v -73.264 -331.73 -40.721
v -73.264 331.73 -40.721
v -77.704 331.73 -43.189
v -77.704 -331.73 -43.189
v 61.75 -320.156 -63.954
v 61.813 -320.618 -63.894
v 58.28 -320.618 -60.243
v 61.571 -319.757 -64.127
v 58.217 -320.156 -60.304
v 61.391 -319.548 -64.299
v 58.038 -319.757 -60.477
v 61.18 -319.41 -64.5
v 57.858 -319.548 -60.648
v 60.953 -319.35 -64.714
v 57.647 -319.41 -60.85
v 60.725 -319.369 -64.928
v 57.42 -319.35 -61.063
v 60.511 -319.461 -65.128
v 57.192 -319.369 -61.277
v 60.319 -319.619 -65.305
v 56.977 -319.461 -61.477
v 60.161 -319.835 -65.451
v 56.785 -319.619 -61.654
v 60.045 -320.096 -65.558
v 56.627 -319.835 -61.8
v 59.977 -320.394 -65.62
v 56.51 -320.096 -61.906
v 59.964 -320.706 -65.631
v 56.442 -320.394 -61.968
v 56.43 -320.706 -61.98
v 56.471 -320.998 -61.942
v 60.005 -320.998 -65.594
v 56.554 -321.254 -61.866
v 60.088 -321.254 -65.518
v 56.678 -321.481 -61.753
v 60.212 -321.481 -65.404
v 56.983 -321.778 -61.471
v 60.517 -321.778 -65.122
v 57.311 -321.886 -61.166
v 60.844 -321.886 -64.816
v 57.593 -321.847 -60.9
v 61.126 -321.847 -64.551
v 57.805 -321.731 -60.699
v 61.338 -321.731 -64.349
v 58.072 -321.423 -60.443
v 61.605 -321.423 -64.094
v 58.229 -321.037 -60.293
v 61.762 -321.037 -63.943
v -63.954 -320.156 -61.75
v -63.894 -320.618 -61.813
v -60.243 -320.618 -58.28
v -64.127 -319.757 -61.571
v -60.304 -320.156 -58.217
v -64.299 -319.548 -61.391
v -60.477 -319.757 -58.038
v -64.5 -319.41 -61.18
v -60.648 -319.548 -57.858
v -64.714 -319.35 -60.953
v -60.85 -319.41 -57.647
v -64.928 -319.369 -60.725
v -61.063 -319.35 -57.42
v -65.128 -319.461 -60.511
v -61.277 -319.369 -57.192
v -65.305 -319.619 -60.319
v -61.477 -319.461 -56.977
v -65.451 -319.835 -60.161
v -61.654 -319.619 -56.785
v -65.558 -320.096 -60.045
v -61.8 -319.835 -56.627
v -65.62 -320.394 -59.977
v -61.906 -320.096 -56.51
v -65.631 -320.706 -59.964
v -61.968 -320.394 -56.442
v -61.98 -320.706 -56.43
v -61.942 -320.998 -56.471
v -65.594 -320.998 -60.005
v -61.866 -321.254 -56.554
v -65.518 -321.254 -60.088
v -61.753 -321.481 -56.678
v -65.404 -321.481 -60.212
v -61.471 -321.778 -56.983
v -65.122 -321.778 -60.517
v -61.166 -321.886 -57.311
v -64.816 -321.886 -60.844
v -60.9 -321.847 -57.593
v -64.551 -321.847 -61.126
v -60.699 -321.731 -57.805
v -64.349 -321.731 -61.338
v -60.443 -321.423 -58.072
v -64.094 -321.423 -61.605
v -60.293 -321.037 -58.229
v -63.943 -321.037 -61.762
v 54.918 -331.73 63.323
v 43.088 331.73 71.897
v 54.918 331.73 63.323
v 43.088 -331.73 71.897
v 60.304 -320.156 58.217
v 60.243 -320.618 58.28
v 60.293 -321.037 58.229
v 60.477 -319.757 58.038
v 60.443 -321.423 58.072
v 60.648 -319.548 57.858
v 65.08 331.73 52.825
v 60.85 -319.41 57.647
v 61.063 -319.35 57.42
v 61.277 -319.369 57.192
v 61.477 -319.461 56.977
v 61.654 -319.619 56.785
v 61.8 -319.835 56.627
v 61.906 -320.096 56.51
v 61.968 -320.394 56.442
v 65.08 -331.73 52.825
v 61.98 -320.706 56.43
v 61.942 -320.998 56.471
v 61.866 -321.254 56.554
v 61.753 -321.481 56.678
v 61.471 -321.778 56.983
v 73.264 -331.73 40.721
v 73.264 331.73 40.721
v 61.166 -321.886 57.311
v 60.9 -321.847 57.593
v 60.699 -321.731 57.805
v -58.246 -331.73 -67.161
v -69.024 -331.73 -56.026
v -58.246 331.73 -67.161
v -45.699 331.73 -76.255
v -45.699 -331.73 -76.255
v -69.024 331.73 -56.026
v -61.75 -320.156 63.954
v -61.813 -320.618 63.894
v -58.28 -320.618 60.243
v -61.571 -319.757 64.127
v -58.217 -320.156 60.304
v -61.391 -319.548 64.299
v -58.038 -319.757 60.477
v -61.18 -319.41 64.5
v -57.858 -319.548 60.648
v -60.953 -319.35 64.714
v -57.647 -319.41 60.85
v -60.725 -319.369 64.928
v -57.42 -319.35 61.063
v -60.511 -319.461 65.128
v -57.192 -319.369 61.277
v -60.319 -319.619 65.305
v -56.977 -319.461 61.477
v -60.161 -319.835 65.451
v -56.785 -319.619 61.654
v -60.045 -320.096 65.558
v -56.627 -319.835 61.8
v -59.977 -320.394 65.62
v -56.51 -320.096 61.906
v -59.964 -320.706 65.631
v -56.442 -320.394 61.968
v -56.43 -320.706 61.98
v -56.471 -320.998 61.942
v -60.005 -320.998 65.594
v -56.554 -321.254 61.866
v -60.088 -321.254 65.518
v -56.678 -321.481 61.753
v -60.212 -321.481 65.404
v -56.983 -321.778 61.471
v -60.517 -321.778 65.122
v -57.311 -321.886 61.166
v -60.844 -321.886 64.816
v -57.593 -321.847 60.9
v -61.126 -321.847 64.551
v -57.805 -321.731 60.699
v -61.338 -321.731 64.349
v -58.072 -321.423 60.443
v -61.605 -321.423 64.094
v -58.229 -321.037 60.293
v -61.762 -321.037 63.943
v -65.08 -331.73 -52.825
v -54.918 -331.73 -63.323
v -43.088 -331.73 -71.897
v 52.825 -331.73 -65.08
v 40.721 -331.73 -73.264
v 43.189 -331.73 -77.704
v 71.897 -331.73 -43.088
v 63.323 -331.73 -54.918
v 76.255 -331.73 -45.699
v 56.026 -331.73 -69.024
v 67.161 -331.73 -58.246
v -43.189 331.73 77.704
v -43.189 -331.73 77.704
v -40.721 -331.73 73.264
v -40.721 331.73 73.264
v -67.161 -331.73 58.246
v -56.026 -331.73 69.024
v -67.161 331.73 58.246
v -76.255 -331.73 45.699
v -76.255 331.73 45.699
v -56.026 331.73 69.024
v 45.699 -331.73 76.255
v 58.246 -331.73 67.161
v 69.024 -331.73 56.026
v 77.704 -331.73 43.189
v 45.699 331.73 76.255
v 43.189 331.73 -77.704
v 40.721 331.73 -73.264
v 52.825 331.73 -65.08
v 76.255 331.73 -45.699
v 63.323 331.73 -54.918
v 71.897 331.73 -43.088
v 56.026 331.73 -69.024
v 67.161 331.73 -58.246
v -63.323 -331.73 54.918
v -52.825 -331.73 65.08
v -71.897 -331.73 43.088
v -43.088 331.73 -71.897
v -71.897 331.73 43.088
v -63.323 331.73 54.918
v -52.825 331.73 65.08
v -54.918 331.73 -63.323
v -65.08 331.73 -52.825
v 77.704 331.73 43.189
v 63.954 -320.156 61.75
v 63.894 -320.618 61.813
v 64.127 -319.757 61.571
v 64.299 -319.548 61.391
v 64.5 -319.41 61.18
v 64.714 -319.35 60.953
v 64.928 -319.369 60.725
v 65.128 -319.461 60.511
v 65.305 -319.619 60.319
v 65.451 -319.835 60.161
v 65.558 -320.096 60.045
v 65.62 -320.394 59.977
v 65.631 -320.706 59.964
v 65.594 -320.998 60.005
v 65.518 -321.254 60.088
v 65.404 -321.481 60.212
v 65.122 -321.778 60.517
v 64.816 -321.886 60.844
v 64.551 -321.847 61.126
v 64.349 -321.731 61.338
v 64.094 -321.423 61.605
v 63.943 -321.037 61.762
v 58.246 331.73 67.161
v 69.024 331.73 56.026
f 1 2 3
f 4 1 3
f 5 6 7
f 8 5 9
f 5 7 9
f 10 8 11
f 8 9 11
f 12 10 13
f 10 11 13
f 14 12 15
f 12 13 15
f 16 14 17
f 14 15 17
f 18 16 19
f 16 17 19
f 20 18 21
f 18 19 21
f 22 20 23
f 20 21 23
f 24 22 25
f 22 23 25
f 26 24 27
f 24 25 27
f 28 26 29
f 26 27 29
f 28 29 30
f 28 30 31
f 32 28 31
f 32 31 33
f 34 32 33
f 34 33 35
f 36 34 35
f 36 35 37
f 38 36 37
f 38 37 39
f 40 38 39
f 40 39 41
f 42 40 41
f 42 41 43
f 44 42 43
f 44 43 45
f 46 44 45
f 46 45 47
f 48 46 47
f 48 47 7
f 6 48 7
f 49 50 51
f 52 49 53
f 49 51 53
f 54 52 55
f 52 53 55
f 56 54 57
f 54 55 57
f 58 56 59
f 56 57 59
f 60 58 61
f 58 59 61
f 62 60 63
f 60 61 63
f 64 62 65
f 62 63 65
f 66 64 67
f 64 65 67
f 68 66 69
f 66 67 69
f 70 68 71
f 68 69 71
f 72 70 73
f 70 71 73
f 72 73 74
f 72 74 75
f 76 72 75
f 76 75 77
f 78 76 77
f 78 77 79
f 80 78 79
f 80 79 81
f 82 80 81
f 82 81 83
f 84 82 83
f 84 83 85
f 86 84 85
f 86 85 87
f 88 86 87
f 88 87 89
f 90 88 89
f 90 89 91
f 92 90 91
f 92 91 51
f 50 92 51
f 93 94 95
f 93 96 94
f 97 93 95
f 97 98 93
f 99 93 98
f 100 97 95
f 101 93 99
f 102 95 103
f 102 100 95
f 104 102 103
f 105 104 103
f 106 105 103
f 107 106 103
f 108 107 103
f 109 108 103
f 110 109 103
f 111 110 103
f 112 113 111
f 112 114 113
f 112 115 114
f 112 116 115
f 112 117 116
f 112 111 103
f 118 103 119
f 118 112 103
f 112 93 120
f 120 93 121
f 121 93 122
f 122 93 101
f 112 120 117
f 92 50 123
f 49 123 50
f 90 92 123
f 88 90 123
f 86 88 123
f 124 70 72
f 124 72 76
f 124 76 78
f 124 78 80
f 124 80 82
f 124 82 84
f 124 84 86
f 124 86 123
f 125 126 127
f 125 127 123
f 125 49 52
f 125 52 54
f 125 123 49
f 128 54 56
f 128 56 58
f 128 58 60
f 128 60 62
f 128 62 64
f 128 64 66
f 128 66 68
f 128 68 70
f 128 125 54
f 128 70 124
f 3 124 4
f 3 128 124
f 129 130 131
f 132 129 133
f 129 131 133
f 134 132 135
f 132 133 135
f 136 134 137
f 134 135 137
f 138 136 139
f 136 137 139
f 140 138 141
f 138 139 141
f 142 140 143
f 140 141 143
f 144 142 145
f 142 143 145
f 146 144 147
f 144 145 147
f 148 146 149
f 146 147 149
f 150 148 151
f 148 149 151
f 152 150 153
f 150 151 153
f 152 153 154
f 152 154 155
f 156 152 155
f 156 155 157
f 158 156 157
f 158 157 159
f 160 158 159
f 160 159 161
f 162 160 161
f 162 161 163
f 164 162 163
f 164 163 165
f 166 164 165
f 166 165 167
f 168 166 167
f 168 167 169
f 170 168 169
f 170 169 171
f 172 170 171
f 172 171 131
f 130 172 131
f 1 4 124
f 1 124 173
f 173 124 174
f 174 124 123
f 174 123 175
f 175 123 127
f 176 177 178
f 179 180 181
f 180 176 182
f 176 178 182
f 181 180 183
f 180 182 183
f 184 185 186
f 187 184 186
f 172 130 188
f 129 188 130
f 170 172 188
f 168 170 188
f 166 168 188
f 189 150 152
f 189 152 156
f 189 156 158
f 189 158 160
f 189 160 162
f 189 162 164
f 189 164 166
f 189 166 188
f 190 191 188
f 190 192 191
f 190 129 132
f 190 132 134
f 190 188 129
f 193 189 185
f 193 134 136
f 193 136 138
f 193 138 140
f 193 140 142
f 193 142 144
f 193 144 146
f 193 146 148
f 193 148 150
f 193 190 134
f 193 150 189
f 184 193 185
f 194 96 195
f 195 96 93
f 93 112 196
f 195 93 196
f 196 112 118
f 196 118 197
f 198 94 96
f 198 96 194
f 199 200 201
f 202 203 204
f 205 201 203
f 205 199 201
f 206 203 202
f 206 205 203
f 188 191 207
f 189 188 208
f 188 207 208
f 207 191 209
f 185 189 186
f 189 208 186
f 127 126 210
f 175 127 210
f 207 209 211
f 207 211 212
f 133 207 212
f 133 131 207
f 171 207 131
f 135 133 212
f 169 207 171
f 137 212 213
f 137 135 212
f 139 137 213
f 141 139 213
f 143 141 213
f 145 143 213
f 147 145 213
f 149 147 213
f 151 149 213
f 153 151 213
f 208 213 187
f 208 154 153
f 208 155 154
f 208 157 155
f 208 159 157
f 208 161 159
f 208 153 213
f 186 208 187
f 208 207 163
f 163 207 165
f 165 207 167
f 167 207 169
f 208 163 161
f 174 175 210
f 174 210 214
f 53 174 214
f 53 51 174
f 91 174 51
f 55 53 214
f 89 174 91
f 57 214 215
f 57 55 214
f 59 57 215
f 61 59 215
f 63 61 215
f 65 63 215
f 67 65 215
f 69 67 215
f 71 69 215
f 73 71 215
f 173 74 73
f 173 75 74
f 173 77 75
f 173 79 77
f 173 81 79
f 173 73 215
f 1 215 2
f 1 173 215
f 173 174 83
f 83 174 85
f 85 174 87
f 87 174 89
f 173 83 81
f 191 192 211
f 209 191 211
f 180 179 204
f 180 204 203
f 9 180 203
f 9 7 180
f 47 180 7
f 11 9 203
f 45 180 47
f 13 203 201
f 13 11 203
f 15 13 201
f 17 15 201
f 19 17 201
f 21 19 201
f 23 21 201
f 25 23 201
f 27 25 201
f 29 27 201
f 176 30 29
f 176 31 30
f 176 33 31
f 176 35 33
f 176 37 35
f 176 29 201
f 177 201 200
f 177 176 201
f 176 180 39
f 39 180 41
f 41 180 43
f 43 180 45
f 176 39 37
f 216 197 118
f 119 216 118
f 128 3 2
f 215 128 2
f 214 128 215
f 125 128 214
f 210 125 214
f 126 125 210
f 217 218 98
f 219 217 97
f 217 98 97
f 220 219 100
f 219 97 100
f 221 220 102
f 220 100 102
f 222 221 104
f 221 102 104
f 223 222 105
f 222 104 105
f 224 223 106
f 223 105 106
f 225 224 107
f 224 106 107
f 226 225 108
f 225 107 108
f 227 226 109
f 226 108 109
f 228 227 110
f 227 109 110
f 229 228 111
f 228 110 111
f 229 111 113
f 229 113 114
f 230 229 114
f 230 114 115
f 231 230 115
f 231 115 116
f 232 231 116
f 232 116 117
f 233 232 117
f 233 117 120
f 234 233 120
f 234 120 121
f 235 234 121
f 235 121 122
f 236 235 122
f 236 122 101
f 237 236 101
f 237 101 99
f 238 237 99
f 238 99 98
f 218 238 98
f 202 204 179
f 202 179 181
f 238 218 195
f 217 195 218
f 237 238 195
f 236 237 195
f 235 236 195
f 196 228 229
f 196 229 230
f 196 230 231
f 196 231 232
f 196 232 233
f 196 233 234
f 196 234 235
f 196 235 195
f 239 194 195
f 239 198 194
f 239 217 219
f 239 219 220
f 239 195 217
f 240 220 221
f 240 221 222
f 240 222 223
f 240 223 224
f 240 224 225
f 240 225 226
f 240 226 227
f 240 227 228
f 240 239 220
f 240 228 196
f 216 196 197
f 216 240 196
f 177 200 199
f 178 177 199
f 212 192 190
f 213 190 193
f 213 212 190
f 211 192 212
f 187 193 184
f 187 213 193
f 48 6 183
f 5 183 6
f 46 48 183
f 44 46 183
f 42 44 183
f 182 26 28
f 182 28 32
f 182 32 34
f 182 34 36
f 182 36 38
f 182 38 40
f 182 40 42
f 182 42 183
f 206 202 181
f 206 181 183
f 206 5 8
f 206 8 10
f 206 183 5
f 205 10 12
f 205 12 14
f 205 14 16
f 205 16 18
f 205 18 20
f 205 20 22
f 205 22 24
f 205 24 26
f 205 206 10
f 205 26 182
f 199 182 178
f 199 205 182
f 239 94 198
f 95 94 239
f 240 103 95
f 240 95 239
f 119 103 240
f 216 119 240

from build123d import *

# Parameters (mm, degrees)
SKETCH2_R               = 88.9
SKETCH2_R_2             = 83.82
BOSS_EXTRUDE1_DEPTH     = 331.730223
CUT_EXTRUDE1_DEPTH      = 332.730223
CUT_EXTRUDE1_DEPTH_BACK = 332.730223
SKETCH5_R               = 1.27
BOLT_HOLES_DEPTH        = 29.911624556
BOLT_PATTERN_COUNT      = 4


with BuildPart() as part:
    # Sketch2 → Boss-Extrude1 (new body, symmetric)
    with BuildSketch(Plane(origin=(0, 0, 0), x_dir=(1, 0, 0), z_dir=(0, 1, 0))):
        Circle(SKETCH2_R)
        Circle(SKETCH2_R_2, mode=Mode.SUBTRACT)
    extrude(amount=BOSS_EXTRUDE1_DEPTH, both=True)

    # Sketch3 → Cut-Extrude1 (cut, two sides)
    with BuildSketch(Plane(origin=(0, 0, 0), x_dir=(1, 0, 0), z_dir=(0, 1, 0))) as cut_extrude1_sk:
        Polygon((169.661755759, -94.300371224), (0, 0), (169.661755759, 101.677593364), align=None)
        Polygon((0, 0), (53.900027233, 96.974944394), (-58.116685864, 96.974944394), align=None)
        Polygon((-123.741299607, 68.777140945), (-123.741299607, -74.157652604), (0, 0), align=None)
        Polygon((-65.840936026, -118.45858783), (0, 0), (70.991745134, -118.45858783), align=None)
    extrude(amount=CUT_EXTRUDE1_DEPTH, mode=Mode.SUBTRACT)
    extrude(cut_extrude1_sk.sketch, amount=-CUT_EXTRUDE1_DEPTH_BACK, mode=Mode.SUBTRACT)

    # Sketch5 → Bolt holes (cut, through all)
    with BuildSketch(Plane(origin=(-56.309218645, 0, 58.175814955), x_dir=(-0.718540152, 0, -0.695485478), z_dir=(0.695485478, 0, -0.718540152))):
        with Locations((-1.29201311, -320.617723)):
            Circle(SKETCH5_R)
    bolt_holes = extrude(amount=-BOLT_HOLES_DEPTH, mode=Mode.SUBTRACT)

    # Bolt pattern: Bolt holes ×4 about axis
    bolt_pattern_axis = Axis((0, 331.730223, 0), (0, 1, 0))
    for i in range(1, BOLT_PATTERN_COUNT):
        add(bolt_holes.rotate(bolt_pattern_axis, i * 360 / BOLT_PATTERN_COUNT), mode=Mode.SUBTRACT)


solid = part.part
